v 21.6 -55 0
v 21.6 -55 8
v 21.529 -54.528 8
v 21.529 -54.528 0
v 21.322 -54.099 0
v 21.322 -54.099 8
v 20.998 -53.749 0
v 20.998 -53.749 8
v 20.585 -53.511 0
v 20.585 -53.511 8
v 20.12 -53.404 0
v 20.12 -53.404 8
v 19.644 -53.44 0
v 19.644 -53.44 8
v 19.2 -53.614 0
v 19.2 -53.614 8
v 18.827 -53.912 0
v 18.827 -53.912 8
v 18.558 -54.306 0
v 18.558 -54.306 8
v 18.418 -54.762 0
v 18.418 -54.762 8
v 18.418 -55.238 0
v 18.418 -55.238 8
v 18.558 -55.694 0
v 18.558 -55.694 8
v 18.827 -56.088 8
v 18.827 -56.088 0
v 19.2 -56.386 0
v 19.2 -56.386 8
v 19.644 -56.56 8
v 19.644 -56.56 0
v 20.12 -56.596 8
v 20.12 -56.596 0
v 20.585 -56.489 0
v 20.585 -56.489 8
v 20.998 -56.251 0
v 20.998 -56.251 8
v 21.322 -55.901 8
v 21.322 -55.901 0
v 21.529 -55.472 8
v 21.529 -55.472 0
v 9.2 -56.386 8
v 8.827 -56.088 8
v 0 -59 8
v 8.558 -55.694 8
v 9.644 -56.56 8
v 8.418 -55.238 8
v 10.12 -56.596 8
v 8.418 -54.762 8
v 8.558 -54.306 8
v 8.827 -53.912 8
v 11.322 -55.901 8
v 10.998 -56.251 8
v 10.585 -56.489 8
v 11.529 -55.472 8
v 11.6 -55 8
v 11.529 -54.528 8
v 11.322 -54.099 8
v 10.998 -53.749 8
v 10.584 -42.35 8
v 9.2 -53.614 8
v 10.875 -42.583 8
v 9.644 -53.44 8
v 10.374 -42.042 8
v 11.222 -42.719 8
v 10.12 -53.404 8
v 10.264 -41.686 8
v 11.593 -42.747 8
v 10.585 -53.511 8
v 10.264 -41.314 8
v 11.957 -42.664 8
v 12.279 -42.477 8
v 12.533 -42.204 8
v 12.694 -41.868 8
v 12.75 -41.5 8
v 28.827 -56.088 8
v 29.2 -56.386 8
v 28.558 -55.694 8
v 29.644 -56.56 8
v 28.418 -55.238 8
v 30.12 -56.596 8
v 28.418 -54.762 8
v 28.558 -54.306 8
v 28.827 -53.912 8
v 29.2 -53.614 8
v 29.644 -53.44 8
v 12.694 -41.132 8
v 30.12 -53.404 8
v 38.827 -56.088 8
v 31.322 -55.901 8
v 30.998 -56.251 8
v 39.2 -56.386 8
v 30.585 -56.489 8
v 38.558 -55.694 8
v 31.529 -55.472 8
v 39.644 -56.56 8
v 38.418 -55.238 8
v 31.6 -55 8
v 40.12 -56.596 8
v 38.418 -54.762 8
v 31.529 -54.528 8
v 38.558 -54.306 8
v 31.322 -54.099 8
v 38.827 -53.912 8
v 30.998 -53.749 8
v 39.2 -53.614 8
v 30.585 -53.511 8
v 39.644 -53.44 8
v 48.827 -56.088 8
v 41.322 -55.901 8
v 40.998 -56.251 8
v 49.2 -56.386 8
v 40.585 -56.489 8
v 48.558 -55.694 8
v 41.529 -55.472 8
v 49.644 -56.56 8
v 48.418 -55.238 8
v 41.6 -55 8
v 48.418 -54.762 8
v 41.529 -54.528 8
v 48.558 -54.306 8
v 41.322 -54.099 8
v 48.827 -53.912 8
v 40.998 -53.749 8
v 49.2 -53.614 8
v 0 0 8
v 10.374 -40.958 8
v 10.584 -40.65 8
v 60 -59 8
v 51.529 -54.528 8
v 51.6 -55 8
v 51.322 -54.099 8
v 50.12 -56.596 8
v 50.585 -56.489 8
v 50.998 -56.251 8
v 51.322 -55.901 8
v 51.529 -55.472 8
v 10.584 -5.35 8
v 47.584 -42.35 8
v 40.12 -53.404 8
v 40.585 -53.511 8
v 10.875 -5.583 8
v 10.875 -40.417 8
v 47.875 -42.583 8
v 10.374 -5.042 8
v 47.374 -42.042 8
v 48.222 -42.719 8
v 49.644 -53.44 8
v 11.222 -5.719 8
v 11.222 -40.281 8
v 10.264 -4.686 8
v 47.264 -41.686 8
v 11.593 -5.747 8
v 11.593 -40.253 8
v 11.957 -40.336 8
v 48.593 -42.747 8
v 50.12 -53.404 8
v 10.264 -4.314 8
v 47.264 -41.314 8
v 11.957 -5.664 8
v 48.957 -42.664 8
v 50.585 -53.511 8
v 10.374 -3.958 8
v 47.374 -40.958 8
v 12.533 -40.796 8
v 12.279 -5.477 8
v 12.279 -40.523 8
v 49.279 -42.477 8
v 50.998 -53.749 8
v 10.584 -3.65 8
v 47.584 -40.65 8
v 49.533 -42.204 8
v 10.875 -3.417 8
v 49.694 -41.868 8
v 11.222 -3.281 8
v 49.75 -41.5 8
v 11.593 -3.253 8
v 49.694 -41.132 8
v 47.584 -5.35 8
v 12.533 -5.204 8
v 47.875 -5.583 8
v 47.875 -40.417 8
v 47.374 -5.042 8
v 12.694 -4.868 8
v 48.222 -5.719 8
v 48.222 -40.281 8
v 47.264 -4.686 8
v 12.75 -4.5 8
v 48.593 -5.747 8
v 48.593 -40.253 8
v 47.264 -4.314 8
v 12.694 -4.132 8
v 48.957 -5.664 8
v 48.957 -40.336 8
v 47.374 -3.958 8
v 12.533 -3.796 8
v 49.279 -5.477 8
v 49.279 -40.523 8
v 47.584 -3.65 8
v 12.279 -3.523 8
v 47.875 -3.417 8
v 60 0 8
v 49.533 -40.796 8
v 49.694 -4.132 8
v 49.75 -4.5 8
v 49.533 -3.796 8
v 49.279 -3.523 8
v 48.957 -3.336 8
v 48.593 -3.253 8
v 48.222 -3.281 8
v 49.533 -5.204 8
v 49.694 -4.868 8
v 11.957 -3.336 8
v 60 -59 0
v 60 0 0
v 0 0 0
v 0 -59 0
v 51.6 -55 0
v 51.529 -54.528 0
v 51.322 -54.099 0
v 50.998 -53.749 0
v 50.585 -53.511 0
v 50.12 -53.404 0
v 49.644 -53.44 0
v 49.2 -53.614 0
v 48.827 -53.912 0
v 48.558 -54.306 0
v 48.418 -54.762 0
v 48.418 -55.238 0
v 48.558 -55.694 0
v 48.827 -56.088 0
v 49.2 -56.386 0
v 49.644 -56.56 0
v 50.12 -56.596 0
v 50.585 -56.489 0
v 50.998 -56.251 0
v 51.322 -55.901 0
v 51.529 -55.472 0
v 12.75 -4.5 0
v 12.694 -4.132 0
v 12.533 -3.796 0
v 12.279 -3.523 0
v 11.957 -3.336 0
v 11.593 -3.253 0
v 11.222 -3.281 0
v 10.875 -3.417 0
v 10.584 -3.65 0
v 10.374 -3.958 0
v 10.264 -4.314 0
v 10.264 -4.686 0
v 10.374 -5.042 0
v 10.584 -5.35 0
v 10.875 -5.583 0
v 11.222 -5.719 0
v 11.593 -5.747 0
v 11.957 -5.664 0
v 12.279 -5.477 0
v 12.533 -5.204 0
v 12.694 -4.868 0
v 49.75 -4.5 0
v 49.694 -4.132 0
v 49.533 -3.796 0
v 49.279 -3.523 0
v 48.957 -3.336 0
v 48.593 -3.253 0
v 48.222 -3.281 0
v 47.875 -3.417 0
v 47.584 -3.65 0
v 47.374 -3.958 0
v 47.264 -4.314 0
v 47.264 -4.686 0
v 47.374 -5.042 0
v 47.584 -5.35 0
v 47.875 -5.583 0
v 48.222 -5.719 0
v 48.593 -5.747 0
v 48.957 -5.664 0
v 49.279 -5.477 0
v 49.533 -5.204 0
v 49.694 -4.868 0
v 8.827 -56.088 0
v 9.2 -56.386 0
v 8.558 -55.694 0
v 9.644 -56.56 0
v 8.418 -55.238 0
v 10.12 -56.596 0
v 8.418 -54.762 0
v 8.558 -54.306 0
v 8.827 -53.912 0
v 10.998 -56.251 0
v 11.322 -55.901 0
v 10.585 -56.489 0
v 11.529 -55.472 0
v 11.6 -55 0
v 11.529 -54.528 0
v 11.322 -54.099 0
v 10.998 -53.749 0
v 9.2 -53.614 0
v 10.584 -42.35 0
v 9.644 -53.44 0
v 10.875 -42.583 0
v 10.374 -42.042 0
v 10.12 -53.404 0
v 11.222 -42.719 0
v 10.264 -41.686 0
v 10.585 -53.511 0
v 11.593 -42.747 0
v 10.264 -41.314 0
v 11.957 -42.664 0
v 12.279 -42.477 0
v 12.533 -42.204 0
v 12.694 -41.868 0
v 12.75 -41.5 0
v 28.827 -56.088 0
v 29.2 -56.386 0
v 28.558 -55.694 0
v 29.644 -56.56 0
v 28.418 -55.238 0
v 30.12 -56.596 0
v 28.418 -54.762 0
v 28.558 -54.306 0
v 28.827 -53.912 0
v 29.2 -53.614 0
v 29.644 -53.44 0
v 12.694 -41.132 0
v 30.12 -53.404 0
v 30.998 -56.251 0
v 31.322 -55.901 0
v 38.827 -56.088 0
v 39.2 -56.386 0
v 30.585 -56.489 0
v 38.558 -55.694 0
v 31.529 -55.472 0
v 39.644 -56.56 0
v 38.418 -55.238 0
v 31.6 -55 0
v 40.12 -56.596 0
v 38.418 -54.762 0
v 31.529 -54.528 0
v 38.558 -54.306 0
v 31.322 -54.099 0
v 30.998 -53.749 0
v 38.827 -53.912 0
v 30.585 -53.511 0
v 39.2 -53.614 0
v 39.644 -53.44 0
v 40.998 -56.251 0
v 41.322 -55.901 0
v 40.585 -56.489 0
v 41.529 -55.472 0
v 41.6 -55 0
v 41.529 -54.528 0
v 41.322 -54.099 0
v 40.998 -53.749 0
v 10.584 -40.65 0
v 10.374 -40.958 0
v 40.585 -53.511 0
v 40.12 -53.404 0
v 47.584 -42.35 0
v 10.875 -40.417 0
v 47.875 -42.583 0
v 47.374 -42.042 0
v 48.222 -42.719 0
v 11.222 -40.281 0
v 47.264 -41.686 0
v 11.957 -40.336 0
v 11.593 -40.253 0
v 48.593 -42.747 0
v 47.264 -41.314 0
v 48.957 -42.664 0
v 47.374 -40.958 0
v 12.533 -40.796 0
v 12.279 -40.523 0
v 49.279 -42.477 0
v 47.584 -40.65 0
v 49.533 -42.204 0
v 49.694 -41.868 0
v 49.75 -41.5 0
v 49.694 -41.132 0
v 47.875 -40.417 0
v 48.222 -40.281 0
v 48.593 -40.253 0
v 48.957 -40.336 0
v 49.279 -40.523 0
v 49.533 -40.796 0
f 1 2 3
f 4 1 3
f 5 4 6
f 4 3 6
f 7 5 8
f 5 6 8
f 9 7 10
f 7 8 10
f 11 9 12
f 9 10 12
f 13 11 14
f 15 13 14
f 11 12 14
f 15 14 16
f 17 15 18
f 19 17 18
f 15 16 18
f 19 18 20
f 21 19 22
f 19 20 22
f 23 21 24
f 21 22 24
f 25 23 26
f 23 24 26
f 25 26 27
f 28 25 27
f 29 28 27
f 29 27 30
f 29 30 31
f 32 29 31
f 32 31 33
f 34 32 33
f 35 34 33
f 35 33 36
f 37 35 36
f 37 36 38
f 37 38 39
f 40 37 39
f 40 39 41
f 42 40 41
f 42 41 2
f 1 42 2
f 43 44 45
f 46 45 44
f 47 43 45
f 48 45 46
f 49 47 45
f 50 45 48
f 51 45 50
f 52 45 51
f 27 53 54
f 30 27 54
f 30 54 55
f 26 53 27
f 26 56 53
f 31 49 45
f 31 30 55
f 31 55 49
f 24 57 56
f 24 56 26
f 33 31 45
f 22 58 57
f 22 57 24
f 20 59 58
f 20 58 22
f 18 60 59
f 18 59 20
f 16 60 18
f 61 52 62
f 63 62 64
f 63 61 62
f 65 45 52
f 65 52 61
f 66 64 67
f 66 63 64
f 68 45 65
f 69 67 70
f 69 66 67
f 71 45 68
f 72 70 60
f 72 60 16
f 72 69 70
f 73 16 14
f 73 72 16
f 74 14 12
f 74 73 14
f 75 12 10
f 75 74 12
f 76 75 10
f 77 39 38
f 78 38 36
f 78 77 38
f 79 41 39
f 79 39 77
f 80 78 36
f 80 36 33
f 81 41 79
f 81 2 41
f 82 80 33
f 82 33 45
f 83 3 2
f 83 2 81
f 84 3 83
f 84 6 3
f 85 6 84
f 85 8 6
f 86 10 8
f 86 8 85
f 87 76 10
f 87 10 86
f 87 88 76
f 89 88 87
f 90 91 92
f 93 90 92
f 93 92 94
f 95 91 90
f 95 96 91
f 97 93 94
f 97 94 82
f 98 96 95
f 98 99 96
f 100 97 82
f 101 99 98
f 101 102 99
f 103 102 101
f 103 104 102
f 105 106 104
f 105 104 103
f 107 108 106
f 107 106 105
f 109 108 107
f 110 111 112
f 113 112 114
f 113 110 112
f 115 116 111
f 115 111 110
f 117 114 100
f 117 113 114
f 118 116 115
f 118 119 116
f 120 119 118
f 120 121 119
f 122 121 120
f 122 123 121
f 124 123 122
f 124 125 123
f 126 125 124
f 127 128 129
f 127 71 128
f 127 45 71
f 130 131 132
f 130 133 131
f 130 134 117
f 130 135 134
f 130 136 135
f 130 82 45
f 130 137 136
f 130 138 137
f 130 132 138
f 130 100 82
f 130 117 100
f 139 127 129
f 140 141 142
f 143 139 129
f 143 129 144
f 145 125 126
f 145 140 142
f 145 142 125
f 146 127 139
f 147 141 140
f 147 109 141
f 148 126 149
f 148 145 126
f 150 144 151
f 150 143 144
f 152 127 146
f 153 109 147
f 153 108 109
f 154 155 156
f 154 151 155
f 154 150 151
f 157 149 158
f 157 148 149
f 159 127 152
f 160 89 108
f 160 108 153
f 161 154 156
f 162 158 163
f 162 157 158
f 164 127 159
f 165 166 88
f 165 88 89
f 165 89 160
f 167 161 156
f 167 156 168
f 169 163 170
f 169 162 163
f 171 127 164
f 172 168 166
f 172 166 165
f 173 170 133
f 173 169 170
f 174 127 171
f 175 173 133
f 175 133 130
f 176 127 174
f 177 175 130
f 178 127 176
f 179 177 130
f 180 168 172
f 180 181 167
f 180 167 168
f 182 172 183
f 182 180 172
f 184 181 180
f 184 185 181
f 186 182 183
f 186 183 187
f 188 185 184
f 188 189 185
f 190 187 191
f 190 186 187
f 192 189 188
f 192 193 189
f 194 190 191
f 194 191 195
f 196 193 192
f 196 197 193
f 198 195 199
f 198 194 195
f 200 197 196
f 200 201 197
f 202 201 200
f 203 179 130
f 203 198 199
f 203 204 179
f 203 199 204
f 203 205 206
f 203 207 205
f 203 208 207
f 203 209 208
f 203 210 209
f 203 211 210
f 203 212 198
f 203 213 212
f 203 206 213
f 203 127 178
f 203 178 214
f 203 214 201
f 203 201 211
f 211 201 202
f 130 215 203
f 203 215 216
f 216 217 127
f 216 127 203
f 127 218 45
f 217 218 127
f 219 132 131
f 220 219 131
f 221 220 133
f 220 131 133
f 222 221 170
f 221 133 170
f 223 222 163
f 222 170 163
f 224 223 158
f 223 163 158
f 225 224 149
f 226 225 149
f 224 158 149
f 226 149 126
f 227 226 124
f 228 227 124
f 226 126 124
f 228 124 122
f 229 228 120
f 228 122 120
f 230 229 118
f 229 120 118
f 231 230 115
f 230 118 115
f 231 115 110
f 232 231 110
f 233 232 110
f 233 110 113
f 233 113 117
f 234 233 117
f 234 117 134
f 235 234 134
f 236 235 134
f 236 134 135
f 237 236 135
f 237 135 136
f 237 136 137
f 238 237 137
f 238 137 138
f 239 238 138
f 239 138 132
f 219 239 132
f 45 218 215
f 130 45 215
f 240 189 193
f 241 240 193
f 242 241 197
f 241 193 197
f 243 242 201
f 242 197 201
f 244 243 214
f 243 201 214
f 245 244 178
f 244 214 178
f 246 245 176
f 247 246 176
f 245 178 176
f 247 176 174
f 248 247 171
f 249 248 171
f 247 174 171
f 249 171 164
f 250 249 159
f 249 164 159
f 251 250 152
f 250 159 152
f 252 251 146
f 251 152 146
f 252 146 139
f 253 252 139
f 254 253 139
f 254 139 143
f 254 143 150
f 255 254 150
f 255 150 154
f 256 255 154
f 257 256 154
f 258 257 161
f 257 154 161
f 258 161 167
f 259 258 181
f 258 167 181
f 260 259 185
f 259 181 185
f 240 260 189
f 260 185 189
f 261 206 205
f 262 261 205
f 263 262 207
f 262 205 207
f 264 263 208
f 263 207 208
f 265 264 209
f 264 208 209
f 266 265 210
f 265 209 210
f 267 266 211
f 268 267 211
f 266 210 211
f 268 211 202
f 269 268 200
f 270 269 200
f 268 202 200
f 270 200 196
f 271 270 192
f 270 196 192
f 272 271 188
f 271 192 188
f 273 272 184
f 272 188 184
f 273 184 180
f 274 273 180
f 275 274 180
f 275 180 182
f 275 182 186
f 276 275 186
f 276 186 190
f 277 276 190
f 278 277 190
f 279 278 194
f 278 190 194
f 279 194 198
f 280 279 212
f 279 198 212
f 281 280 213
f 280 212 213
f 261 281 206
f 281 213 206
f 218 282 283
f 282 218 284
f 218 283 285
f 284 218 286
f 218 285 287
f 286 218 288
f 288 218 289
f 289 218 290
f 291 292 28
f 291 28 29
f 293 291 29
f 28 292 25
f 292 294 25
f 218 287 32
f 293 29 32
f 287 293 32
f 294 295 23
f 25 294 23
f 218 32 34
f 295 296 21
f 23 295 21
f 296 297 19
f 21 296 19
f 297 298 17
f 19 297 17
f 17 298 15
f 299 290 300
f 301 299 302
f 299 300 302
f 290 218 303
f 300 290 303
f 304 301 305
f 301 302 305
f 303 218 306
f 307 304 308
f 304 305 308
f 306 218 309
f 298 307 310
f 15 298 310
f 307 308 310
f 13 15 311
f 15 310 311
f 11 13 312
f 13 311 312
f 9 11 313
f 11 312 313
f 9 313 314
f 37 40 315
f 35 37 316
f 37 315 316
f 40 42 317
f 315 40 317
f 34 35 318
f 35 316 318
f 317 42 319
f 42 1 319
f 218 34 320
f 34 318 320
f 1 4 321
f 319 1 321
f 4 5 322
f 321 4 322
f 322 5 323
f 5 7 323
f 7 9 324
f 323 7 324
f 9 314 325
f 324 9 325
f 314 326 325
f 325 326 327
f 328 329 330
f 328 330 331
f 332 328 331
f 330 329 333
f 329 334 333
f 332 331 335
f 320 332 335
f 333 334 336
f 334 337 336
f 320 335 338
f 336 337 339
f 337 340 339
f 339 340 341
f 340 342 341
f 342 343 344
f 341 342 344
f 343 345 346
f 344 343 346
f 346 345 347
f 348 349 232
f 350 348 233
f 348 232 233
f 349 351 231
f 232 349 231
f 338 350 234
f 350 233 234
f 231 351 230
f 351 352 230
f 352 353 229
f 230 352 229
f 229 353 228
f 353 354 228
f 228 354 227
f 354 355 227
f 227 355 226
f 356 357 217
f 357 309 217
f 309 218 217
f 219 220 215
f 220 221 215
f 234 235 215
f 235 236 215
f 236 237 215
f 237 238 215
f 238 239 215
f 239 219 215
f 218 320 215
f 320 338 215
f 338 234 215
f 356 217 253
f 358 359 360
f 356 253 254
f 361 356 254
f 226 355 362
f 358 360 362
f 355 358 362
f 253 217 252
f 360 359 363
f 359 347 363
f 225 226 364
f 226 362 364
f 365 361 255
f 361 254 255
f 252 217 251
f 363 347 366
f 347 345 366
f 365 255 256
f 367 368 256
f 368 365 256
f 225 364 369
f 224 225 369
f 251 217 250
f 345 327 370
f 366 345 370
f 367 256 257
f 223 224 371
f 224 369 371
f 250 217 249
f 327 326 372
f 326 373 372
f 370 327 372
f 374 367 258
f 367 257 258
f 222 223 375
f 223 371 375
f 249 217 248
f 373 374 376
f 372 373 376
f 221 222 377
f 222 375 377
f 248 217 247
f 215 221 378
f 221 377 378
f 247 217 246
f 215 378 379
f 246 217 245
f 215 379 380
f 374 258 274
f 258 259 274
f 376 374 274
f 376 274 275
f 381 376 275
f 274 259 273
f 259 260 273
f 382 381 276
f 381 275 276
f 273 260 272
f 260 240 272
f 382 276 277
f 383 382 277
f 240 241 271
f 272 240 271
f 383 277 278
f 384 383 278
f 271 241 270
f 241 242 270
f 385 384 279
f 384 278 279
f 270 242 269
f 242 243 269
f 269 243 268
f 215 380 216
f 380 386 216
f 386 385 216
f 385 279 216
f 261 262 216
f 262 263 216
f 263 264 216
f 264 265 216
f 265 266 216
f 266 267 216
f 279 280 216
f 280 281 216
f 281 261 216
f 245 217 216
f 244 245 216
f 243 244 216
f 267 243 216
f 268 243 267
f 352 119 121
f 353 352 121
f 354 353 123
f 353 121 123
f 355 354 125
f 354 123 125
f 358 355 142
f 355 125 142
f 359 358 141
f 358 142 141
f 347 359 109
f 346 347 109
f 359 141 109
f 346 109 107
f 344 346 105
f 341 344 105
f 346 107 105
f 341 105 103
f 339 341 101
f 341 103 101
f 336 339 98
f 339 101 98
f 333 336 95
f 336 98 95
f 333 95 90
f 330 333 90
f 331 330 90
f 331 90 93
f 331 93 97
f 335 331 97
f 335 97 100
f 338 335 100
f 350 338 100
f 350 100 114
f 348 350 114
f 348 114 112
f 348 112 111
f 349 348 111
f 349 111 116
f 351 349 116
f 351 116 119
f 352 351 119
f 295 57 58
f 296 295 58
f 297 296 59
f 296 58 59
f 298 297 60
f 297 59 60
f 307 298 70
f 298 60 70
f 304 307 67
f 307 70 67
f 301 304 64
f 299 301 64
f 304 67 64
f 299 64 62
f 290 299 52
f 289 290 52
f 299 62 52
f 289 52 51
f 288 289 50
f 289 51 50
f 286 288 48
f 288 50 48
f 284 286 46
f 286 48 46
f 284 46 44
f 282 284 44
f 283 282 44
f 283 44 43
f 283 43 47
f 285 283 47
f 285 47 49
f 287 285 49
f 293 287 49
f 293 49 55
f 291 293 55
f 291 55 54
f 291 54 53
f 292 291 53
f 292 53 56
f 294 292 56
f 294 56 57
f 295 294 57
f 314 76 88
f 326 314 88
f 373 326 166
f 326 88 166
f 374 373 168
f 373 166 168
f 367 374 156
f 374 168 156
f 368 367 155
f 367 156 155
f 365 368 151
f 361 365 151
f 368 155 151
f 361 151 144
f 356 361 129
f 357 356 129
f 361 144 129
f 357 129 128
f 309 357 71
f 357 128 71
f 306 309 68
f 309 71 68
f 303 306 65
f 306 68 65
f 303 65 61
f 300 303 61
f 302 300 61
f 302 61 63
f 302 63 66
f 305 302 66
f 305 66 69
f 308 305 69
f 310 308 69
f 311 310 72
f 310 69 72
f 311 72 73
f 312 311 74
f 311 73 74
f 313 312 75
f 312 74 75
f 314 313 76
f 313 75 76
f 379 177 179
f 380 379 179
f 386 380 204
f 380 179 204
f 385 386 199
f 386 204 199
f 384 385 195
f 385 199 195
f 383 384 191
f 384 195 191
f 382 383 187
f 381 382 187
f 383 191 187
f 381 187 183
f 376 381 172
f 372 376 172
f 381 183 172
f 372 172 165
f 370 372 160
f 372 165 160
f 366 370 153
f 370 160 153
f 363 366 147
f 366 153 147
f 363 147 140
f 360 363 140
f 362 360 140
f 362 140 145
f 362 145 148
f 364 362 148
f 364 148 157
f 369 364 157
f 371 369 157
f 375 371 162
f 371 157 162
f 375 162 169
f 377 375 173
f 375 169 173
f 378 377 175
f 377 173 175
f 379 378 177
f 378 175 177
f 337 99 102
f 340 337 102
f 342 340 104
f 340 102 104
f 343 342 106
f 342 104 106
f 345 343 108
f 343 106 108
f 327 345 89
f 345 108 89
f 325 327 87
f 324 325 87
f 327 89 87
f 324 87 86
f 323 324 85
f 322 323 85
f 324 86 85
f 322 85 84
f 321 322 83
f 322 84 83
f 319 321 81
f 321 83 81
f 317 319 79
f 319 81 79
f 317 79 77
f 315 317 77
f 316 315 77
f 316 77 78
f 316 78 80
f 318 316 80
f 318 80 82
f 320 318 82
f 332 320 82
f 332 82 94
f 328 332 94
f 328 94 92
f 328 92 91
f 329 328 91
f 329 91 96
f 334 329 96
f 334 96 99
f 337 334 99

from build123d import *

# Parameters (mm, degrees)
SKETCH_1_W          = 60
SKETCH_1_H          = 59
EXTRUDE_1_DEPTH     = 8
SKETCH_2_R          = 1.25
CUT_EXTRUDE_1_DEPTH = 8
SKETCH_3_R          = 1.6
CUT_EXTRUDE_2_DEPTH = 85.528101836


with BuildPart() as part:
    # 草图1 → 凸台-拉伸1 (new body)
    with BuildSketch(Plane.XY):
        with Locations((30, -29.5)):
            Rectangle(SKETCH_1_W, SKETCH_1_H)
    extrude(amount=EXTRUDE_1_DEPTH)

    # 草图2 → 切除-拉伸1 (cut)
    with BuildSketch(Plane.XY.offset(8)):
        with Locations((11.5, -4.5)):
            Circle(SKETCH_2_R)
        with Locations((48.5, -4.5)):
            Circle(SKETCH_2_R)
        with Locations((11.5, -41.5)):
            Circle(SKETCH_2_R)
        with Locations((48.5, -41.5)):
            Circle(SKETCH_2_R)
    extrude(amount=-CUT_EXTRUDE_1_DEPTH, mode=Mode.SUBTRACT)

    # 草图3 → 切除-拉伸2 (cut, through all)
    with BuildSketch(Plane.XY.offset(8)):
        with Locations((10, -55)):
            Circle(SKETCH_3_R)
        with Locations((20, -55)):
            Circle(SKETCH_3_R)
        with Locations((30, -55)):
            Circle(SKETCH_3_R)
        with Locations((40, -55)):
            Circle(SKETCH_3_R)
        with Locations((50, -55)):
            Circle(SKETCH_3_R)
    extrude(amount=-CUT_EXTRUDE_2_DEPTH, mode=Mode.SUBTRACT)


solid = part.part
